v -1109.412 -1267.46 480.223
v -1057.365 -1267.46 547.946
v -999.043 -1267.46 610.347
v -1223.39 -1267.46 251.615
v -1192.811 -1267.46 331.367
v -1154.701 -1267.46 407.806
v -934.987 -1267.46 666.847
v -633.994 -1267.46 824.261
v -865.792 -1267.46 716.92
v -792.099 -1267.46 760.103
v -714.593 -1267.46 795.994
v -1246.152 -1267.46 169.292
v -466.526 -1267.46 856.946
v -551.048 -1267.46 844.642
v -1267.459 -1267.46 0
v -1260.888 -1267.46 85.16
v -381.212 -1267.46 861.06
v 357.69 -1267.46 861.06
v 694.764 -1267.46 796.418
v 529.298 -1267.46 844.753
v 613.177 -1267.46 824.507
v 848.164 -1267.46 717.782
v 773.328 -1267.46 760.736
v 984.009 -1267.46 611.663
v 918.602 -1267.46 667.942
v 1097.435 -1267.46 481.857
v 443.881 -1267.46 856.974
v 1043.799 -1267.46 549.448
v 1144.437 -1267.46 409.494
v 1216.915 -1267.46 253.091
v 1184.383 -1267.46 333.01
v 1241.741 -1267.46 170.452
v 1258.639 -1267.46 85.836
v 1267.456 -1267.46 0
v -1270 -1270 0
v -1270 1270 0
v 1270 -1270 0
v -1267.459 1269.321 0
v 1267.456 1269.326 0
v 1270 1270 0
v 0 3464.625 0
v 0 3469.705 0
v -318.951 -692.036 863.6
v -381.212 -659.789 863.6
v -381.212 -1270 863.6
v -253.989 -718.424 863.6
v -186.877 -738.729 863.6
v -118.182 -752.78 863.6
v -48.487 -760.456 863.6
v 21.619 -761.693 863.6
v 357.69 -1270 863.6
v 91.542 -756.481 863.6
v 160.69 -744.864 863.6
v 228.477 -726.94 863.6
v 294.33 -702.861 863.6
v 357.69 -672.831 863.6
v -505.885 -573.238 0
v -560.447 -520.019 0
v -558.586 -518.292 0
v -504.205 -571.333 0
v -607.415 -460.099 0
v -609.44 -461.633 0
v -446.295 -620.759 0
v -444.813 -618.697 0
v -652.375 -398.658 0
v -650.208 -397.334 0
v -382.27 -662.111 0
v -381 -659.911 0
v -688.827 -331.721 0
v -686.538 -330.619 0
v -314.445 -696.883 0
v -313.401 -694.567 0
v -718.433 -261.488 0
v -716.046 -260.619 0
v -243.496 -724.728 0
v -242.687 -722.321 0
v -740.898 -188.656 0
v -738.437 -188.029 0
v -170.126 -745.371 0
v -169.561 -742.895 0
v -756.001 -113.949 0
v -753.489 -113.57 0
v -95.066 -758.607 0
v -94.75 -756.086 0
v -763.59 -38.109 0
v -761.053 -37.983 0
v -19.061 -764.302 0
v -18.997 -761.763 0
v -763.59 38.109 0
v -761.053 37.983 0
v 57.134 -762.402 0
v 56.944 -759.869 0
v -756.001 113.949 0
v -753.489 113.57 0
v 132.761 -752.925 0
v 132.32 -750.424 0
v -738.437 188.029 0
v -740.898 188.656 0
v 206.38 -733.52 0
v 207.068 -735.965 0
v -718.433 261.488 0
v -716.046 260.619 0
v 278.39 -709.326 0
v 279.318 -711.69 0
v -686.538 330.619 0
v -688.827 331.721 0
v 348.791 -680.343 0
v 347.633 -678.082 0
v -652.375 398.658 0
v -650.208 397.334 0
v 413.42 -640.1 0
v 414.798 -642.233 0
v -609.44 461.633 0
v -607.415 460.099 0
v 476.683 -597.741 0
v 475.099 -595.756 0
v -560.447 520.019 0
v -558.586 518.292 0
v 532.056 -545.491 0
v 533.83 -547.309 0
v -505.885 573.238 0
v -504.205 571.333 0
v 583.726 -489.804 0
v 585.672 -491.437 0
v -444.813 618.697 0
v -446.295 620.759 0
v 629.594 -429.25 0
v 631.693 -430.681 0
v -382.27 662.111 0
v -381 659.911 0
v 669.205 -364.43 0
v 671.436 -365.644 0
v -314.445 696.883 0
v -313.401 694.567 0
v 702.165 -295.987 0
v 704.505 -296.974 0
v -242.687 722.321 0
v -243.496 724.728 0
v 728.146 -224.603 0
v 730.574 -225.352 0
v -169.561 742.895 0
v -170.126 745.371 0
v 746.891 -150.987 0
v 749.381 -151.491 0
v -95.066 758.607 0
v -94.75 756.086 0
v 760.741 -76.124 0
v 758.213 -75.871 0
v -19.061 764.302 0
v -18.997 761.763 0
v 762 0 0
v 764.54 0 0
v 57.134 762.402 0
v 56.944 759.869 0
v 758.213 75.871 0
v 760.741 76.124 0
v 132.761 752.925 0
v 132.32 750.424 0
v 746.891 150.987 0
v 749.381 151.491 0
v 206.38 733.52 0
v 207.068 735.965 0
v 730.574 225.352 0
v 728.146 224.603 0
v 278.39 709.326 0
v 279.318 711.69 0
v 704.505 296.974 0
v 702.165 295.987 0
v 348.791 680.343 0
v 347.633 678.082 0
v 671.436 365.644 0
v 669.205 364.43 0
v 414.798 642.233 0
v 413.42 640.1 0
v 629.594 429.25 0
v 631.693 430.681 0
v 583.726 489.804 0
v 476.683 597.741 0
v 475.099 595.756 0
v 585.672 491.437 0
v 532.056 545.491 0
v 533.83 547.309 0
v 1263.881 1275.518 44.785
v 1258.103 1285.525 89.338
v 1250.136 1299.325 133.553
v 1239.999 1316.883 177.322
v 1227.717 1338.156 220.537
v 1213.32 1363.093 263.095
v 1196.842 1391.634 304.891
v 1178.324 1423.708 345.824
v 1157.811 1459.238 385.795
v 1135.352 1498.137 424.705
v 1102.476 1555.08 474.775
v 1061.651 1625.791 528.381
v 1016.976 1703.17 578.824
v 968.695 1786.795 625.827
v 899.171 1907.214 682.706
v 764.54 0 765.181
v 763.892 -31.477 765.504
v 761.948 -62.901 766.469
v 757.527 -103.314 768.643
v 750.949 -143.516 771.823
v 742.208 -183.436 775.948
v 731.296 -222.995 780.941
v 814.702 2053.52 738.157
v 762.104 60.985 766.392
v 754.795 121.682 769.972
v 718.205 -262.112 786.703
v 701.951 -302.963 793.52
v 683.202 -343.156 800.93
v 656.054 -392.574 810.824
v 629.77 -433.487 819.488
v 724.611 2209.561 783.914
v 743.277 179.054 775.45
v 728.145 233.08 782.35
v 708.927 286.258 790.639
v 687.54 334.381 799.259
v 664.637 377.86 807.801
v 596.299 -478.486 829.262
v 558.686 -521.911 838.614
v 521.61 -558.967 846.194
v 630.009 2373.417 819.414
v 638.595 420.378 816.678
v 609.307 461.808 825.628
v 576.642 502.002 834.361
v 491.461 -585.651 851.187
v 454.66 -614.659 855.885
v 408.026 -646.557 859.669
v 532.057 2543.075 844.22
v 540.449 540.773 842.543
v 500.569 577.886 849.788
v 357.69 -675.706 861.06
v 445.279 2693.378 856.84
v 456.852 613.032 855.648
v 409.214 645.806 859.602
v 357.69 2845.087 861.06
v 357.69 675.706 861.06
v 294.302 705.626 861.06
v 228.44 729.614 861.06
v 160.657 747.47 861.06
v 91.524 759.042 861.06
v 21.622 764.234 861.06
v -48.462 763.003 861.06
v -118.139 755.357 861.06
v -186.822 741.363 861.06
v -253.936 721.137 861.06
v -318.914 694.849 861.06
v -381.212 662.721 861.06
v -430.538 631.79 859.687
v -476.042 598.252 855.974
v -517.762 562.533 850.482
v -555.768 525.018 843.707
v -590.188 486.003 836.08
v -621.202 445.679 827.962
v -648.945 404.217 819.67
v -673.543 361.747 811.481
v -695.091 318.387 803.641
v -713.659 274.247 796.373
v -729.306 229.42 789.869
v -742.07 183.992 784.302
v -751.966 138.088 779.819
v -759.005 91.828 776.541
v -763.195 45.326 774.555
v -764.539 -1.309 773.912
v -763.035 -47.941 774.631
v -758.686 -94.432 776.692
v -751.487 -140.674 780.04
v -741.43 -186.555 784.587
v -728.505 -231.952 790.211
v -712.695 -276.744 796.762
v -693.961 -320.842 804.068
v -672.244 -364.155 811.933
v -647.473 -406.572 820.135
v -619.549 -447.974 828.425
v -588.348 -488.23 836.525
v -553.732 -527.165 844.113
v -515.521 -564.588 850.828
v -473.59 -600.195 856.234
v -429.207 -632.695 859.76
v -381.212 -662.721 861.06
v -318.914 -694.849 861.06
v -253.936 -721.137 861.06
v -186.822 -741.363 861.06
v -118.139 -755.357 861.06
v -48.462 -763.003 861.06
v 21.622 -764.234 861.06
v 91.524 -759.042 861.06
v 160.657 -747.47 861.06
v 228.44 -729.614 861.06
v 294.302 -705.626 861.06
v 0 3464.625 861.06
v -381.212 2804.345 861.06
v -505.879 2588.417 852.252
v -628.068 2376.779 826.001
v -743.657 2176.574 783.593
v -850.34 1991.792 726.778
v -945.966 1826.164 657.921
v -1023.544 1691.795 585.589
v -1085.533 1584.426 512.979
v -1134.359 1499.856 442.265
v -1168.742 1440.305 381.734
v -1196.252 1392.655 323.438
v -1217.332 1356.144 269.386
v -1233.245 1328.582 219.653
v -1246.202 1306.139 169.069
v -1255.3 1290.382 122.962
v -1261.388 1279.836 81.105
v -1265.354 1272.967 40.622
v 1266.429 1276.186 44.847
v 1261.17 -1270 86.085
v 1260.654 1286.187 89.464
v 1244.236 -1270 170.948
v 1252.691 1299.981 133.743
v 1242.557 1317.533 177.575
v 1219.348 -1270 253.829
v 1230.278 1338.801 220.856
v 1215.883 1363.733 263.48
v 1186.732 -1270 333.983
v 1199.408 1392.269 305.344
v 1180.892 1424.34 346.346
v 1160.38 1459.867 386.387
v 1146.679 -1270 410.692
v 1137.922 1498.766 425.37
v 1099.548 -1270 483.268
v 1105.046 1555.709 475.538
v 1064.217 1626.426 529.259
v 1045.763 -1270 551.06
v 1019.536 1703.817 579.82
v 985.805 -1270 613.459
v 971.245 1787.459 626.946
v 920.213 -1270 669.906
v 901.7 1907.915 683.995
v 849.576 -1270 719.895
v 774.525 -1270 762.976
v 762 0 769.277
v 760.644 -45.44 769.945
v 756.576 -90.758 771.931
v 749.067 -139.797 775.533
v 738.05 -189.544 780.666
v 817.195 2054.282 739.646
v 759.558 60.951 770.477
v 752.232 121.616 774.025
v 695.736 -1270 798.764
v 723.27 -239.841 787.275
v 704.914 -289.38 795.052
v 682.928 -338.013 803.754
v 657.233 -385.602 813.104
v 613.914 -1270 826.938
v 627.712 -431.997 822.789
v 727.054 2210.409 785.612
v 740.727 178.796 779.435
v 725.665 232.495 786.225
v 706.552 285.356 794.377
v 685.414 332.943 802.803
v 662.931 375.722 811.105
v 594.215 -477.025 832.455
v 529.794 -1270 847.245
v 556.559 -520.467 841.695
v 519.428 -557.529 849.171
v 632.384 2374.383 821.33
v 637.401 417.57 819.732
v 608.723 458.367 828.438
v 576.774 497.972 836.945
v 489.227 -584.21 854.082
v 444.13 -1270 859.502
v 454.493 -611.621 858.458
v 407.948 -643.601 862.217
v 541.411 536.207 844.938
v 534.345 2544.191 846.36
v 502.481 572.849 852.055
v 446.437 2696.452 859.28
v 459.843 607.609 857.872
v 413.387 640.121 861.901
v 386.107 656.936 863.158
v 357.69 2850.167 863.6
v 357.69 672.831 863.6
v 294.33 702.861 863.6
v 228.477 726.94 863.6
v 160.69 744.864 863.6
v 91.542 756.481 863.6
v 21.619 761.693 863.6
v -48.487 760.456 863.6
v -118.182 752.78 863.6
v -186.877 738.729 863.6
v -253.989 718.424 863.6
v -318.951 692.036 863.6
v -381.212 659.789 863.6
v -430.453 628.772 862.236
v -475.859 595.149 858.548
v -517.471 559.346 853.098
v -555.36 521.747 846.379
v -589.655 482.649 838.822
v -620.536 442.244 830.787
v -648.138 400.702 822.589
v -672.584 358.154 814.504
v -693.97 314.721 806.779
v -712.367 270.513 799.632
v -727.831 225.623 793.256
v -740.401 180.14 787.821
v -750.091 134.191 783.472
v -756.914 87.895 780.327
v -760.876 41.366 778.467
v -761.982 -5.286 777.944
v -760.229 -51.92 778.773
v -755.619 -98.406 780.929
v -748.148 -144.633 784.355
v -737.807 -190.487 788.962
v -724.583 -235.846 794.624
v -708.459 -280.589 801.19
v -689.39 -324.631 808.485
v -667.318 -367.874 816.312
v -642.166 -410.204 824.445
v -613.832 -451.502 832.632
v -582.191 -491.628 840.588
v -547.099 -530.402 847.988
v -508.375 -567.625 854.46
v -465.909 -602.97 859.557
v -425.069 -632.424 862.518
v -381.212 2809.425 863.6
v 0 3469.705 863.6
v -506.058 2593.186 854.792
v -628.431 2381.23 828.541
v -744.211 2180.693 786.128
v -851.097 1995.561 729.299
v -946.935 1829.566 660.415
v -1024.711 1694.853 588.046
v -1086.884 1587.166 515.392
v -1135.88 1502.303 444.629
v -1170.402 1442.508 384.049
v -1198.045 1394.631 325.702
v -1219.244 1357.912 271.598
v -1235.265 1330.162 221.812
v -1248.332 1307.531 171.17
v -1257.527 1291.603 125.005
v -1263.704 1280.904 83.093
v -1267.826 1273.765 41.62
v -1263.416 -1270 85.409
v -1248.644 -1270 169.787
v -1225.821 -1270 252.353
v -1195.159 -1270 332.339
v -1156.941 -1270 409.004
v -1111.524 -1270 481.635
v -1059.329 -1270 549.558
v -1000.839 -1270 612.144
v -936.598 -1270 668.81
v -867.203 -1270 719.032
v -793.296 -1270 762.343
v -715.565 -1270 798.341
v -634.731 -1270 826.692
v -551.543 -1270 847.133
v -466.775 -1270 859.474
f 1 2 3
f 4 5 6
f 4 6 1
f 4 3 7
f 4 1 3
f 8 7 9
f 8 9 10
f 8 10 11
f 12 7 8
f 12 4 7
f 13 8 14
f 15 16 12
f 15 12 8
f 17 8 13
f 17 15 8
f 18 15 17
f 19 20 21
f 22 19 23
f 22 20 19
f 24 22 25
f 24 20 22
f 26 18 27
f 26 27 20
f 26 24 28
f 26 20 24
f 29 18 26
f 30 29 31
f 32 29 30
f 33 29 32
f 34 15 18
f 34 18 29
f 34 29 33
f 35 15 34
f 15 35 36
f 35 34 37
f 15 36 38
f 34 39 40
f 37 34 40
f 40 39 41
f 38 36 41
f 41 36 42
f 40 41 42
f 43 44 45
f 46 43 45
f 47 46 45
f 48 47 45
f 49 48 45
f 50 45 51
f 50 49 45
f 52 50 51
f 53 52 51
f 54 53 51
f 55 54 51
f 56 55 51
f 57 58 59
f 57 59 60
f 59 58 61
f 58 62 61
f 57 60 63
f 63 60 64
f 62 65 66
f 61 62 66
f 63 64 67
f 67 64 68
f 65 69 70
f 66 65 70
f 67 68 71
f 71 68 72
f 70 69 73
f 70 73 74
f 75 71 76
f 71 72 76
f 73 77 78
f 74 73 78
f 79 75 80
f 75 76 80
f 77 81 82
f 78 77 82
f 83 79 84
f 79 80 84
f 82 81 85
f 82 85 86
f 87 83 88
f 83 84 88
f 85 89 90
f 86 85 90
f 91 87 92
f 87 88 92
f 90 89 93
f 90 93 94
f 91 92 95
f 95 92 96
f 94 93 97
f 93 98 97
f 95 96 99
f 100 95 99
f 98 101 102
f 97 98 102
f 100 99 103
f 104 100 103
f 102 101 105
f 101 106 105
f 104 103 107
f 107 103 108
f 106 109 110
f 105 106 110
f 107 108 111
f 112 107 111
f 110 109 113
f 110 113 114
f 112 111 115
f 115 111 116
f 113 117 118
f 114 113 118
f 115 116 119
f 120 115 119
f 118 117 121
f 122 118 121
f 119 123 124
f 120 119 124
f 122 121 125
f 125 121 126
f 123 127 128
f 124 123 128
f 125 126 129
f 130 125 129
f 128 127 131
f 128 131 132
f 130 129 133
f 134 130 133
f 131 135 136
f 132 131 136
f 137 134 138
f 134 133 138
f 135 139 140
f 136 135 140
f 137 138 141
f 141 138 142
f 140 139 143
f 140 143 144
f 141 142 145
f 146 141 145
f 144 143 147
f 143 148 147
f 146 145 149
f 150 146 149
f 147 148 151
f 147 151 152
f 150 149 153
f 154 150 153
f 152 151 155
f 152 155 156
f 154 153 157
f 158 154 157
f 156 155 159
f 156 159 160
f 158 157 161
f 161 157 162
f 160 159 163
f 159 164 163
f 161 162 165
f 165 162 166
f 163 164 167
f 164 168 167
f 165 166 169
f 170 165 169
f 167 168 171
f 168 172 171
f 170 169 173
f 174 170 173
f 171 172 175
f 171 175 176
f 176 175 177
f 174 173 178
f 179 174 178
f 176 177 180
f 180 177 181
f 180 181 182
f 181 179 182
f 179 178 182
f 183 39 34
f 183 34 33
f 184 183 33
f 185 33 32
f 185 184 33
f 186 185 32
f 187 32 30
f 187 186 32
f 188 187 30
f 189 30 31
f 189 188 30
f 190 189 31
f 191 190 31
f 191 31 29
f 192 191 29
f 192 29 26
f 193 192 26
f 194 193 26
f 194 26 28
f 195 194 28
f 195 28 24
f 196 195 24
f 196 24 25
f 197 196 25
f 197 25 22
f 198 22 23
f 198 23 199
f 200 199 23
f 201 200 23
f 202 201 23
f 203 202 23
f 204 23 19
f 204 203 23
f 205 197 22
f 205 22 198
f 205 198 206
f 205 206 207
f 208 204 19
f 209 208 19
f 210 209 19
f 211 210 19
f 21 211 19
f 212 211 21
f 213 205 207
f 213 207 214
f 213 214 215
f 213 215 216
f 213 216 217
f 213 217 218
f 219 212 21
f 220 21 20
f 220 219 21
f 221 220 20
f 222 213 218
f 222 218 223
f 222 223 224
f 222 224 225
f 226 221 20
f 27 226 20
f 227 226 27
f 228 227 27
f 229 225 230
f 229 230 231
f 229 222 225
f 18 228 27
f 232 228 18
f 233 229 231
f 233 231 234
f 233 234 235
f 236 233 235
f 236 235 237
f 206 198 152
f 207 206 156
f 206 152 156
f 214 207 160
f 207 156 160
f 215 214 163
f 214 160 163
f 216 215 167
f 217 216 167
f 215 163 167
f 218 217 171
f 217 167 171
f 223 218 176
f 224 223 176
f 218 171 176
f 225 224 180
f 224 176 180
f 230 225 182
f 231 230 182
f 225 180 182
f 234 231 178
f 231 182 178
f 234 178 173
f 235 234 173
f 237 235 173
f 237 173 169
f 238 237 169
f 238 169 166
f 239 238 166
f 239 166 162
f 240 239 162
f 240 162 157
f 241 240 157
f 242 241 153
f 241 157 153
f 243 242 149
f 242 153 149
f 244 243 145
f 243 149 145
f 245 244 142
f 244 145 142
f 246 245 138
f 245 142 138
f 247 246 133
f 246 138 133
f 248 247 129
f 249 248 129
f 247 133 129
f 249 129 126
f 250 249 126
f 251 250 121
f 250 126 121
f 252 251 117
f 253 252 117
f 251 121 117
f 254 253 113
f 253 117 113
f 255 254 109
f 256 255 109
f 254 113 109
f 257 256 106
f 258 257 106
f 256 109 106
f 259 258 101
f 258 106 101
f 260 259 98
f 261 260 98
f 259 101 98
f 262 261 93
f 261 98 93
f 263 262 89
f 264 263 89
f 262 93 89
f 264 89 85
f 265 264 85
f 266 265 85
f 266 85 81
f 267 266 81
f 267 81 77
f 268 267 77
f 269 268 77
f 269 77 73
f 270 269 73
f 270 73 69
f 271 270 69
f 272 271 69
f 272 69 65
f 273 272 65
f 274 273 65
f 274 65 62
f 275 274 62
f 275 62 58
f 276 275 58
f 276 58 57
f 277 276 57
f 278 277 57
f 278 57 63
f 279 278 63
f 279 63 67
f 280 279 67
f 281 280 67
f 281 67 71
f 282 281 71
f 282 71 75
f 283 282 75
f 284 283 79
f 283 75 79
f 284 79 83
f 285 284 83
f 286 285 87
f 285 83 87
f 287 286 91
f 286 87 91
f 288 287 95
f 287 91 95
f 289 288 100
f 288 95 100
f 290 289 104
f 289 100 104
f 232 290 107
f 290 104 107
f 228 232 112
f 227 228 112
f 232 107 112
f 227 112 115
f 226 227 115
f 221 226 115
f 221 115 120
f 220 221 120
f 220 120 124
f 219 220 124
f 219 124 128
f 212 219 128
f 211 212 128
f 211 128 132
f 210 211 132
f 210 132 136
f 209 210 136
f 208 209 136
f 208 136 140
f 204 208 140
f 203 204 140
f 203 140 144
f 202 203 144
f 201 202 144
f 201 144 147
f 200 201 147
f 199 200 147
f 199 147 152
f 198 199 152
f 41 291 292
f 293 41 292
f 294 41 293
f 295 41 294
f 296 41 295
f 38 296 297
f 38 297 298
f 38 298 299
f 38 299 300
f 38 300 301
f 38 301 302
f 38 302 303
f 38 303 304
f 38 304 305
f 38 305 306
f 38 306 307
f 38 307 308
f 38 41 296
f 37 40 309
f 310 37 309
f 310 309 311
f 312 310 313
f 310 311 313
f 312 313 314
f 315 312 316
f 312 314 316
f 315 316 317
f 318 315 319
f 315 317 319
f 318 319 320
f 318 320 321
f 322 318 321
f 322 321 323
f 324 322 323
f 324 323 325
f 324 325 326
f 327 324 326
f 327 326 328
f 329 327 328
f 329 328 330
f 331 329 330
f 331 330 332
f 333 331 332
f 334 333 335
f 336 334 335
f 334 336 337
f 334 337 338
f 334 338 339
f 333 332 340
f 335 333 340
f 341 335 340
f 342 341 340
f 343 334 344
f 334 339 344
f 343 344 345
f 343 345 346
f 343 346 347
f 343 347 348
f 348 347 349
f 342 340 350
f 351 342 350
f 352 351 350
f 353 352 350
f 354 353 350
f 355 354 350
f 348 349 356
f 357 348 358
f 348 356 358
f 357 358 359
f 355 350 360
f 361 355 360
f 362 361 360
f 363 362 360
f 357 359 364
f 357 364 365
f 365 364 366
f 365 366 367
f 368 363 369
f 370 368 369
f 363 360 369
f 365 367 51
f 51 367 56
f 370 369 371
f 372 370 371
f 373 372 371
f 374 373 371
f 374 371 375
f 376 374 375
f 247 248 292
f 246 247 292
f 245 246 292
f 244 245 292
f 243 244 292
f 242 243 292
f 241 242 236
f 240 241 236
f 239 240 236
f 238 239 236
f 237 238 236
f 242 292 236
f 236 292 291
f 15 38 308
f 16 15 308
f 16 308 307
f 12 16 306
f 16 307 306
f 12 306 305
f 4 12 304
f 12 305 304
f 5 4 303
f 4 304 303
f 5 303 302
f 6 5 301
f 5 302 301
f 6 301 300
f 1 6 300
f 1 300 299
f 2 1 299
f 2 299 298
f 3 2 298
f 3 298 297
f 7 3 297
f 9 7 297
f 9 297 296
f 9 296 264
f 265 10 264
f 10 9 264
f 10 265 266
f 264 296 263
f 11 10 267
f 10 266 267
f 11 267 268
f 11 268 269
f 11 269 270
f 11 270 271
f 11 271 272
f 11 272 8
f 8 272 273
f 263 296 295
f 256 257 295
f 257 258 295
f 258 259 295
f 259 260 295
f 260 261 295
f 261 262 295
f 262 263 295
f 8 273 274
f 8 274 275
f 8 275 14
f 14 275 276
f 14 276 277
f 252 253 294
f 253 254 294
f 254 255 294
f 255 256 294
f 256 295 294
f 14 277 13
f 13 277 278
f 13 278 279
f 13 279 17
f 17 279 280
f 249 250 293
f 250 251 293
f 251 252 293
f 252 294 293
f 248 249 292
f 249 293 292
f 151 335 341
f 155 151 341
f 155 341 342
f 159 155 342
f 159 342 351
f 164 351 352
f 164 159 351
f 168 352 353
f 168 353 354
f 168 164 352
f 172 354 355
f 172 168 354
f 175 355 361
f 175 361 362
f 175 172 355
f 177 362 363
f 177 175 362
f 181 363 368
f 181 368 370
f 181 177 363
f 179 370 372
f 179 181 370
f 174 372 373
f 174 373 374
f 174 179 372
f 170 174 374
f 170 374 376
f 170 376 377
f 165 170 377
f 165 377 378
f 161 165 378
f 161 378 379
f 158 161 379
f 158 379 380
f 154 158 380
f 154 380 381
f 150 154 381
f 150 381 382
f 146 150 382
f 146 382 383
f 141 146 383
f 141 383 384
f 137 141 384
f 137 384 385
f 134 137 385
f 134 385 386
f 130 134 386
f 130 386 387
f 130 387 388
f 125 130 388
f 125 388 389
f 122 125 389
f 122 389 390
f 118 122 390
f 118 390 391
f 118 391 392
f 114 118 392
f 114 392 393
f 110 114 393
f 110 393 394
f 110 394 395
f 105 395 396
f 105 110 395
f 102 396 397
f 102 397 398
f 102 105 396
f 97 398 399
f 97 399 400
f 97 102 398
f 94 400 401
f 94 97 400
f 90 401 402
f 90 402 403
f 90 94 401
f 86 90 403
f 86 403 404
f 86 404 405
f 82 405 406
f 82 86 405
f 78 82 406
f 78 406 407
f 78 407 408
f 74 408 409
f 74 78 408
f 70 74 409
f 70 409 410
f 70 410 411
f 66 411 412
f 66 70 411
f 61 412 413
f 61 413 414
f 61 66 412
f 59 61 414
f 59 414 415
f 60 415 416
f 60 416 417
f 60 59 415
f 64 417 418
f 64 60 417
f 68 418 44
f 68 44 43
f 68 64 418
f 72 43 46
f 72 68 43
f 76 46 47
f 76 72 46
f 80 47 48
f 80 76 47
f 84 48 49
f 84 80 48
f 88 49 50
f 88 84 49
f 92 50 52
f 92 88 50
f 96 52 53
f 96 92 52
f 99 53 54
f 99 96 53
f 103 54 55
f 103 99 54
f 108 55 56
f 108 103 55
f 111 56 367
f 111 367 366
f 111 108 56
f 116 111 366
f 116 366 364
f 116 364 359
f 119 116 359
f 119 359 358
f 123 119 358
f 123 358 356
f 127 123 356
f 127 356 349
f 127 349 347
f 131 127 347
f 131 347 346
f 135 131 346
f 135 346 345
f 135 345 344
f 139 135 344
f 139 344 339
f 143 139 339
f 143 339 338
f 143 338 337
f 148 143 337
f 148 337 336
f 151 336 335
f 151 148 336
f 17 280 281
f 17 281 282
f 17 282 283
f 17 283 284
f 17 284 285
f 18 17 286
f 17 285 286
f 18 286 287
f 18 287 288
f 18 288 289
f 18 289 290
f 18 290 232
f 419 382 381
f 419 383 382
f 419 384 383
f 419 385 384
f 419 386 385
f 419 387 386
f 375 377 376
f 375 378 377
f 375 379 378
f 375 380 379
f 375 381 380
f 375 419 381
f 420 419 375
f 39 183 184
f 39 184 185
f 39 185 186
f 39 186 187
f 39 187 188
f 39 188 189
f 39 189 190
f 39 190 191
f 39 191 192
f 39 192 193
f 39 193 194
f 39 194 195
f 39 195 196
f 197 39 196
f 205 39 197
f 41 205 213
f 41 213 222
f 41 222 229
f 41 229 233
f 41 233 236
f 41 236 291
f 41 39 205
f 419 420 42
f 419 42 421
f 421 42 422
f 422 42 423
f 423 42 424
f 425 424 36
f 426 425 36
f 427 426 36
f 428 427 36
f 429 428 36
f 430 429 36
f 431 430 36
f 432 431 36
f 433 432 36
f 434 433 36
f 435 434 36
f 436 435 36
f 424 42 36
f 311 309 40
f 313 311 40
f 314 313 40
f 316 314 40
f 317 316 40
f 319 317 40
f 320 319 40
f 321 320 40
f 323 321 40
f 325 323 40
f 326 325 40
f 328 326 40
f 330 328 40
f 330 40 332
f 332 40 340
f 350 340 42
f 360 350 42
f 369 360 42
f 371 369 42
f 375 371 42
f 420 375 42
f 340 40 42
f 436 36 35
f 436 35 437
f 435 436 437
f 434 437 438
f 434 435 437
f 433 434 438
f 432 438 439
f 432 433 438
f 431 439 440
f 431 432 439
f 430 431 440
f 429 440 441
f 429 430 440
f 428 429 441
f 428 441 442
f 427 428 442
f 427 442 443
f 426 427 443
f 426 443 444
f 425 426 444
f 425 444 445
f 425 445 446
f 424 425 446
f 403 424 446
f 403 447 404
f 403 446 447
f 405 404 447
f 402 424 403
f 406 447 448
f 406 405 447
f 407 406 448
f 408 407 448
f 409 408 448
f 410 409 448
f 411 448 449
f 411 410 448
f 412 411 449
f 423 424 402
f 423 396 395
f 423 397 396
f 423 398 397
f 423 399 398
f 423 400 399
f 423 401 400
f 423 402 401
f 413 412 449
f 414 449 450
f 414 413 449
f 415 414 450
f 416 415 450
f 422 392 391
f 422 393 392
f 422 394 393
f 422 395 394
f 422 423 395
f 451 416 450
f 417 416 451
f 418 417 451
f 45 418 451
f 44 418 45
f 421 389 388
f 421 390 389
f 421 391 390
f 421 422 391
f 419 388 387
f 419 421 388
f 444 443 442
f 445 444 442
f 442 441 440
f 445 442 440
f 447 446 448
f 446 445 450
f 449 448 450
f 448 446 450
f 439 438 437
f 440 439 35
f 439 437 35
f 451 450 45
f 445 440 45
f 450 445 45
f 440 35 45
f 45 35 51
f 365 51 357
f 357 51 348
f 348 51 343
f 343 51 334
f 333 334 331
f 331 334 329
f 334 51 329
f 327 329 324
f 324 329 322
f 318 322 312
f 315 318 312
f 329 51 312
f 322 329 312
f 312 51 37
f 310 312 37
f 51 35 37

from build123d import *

# Parameters (mm, degrees)
F0_W        = 2540
F0_H        = 2540
F0_R        = 762
F1_DEPTH    = 863.6
F2_T1_DEPTH = 6983.9377403211
F3_T1_DEPTH = 7101.5479143316
F4_T        = -2.54


# Not quite as in the source:
# - a fillet or chamfer that OpenCascade refuses, or shapes differently, is made with other operations: its cross-section is extruded or revolved along the edge and cut away or added


with BuildPart() as f1:
    # F0 (on Top) → F1 (new body)
    with BuildSketch(Plane.XY):
        Rectangle(F0_W, F0_H)
        Circle(F0_R, mode=Mode.SUBTRACT)
        Polygon((0, 3469.7045256125), (-1270, 1270), (1270, 1270), align=None)
    extrude(amount=F1_DEPTH)

    # F2: fillet of radius 889.154855022 on 1 edges, made by hand

    # F2_s2 → F2_t1 (cut)
    with BuildSketch(Plane.XZ.offset(-3491.9688701606)):
        with BuildLine():
            ThreePointArc((-1270, 0), (-1000.8390059169, 612.1435766922), (-381.2124519358, 863.6))
            Line((-381.2124519358, 863.6), (-1270, 863.6))
            Line((-1270, 863.6), (-1270, 0))
        make_face()
    extrude(amount=F2_T1_DEPTH, mode=Mode.SUBTRACT)

    # F3: fillet of radius 913.6832648157 on 1 edges, made by hand

    # F3_s2 → F3_t1 (cut)
    with BuildSketch(Plane.XZ.offset(-3550.7739571658)):
        with BuildLine():
            ThreePointArc((1270, 0), (985.8054016289, 613.4592542868), (357.6904171337, 863.6))
            Line((357.6904171337, 863.6), (1270, 863.6))
            Line((1270, 863.6), (1270, 0))
        make_face()
    extrude(amount=F3_T1_DEPTH, mode=Mode.SUBTRACT)

    # F4
    f4_openings = [f1.faces().sort_by_distance(p)[0] for p in [
        (-1216.22603, 0, 0),
    ]]
    offset(amount=F4_T, openings=f4_openings)


solid = f1.part
